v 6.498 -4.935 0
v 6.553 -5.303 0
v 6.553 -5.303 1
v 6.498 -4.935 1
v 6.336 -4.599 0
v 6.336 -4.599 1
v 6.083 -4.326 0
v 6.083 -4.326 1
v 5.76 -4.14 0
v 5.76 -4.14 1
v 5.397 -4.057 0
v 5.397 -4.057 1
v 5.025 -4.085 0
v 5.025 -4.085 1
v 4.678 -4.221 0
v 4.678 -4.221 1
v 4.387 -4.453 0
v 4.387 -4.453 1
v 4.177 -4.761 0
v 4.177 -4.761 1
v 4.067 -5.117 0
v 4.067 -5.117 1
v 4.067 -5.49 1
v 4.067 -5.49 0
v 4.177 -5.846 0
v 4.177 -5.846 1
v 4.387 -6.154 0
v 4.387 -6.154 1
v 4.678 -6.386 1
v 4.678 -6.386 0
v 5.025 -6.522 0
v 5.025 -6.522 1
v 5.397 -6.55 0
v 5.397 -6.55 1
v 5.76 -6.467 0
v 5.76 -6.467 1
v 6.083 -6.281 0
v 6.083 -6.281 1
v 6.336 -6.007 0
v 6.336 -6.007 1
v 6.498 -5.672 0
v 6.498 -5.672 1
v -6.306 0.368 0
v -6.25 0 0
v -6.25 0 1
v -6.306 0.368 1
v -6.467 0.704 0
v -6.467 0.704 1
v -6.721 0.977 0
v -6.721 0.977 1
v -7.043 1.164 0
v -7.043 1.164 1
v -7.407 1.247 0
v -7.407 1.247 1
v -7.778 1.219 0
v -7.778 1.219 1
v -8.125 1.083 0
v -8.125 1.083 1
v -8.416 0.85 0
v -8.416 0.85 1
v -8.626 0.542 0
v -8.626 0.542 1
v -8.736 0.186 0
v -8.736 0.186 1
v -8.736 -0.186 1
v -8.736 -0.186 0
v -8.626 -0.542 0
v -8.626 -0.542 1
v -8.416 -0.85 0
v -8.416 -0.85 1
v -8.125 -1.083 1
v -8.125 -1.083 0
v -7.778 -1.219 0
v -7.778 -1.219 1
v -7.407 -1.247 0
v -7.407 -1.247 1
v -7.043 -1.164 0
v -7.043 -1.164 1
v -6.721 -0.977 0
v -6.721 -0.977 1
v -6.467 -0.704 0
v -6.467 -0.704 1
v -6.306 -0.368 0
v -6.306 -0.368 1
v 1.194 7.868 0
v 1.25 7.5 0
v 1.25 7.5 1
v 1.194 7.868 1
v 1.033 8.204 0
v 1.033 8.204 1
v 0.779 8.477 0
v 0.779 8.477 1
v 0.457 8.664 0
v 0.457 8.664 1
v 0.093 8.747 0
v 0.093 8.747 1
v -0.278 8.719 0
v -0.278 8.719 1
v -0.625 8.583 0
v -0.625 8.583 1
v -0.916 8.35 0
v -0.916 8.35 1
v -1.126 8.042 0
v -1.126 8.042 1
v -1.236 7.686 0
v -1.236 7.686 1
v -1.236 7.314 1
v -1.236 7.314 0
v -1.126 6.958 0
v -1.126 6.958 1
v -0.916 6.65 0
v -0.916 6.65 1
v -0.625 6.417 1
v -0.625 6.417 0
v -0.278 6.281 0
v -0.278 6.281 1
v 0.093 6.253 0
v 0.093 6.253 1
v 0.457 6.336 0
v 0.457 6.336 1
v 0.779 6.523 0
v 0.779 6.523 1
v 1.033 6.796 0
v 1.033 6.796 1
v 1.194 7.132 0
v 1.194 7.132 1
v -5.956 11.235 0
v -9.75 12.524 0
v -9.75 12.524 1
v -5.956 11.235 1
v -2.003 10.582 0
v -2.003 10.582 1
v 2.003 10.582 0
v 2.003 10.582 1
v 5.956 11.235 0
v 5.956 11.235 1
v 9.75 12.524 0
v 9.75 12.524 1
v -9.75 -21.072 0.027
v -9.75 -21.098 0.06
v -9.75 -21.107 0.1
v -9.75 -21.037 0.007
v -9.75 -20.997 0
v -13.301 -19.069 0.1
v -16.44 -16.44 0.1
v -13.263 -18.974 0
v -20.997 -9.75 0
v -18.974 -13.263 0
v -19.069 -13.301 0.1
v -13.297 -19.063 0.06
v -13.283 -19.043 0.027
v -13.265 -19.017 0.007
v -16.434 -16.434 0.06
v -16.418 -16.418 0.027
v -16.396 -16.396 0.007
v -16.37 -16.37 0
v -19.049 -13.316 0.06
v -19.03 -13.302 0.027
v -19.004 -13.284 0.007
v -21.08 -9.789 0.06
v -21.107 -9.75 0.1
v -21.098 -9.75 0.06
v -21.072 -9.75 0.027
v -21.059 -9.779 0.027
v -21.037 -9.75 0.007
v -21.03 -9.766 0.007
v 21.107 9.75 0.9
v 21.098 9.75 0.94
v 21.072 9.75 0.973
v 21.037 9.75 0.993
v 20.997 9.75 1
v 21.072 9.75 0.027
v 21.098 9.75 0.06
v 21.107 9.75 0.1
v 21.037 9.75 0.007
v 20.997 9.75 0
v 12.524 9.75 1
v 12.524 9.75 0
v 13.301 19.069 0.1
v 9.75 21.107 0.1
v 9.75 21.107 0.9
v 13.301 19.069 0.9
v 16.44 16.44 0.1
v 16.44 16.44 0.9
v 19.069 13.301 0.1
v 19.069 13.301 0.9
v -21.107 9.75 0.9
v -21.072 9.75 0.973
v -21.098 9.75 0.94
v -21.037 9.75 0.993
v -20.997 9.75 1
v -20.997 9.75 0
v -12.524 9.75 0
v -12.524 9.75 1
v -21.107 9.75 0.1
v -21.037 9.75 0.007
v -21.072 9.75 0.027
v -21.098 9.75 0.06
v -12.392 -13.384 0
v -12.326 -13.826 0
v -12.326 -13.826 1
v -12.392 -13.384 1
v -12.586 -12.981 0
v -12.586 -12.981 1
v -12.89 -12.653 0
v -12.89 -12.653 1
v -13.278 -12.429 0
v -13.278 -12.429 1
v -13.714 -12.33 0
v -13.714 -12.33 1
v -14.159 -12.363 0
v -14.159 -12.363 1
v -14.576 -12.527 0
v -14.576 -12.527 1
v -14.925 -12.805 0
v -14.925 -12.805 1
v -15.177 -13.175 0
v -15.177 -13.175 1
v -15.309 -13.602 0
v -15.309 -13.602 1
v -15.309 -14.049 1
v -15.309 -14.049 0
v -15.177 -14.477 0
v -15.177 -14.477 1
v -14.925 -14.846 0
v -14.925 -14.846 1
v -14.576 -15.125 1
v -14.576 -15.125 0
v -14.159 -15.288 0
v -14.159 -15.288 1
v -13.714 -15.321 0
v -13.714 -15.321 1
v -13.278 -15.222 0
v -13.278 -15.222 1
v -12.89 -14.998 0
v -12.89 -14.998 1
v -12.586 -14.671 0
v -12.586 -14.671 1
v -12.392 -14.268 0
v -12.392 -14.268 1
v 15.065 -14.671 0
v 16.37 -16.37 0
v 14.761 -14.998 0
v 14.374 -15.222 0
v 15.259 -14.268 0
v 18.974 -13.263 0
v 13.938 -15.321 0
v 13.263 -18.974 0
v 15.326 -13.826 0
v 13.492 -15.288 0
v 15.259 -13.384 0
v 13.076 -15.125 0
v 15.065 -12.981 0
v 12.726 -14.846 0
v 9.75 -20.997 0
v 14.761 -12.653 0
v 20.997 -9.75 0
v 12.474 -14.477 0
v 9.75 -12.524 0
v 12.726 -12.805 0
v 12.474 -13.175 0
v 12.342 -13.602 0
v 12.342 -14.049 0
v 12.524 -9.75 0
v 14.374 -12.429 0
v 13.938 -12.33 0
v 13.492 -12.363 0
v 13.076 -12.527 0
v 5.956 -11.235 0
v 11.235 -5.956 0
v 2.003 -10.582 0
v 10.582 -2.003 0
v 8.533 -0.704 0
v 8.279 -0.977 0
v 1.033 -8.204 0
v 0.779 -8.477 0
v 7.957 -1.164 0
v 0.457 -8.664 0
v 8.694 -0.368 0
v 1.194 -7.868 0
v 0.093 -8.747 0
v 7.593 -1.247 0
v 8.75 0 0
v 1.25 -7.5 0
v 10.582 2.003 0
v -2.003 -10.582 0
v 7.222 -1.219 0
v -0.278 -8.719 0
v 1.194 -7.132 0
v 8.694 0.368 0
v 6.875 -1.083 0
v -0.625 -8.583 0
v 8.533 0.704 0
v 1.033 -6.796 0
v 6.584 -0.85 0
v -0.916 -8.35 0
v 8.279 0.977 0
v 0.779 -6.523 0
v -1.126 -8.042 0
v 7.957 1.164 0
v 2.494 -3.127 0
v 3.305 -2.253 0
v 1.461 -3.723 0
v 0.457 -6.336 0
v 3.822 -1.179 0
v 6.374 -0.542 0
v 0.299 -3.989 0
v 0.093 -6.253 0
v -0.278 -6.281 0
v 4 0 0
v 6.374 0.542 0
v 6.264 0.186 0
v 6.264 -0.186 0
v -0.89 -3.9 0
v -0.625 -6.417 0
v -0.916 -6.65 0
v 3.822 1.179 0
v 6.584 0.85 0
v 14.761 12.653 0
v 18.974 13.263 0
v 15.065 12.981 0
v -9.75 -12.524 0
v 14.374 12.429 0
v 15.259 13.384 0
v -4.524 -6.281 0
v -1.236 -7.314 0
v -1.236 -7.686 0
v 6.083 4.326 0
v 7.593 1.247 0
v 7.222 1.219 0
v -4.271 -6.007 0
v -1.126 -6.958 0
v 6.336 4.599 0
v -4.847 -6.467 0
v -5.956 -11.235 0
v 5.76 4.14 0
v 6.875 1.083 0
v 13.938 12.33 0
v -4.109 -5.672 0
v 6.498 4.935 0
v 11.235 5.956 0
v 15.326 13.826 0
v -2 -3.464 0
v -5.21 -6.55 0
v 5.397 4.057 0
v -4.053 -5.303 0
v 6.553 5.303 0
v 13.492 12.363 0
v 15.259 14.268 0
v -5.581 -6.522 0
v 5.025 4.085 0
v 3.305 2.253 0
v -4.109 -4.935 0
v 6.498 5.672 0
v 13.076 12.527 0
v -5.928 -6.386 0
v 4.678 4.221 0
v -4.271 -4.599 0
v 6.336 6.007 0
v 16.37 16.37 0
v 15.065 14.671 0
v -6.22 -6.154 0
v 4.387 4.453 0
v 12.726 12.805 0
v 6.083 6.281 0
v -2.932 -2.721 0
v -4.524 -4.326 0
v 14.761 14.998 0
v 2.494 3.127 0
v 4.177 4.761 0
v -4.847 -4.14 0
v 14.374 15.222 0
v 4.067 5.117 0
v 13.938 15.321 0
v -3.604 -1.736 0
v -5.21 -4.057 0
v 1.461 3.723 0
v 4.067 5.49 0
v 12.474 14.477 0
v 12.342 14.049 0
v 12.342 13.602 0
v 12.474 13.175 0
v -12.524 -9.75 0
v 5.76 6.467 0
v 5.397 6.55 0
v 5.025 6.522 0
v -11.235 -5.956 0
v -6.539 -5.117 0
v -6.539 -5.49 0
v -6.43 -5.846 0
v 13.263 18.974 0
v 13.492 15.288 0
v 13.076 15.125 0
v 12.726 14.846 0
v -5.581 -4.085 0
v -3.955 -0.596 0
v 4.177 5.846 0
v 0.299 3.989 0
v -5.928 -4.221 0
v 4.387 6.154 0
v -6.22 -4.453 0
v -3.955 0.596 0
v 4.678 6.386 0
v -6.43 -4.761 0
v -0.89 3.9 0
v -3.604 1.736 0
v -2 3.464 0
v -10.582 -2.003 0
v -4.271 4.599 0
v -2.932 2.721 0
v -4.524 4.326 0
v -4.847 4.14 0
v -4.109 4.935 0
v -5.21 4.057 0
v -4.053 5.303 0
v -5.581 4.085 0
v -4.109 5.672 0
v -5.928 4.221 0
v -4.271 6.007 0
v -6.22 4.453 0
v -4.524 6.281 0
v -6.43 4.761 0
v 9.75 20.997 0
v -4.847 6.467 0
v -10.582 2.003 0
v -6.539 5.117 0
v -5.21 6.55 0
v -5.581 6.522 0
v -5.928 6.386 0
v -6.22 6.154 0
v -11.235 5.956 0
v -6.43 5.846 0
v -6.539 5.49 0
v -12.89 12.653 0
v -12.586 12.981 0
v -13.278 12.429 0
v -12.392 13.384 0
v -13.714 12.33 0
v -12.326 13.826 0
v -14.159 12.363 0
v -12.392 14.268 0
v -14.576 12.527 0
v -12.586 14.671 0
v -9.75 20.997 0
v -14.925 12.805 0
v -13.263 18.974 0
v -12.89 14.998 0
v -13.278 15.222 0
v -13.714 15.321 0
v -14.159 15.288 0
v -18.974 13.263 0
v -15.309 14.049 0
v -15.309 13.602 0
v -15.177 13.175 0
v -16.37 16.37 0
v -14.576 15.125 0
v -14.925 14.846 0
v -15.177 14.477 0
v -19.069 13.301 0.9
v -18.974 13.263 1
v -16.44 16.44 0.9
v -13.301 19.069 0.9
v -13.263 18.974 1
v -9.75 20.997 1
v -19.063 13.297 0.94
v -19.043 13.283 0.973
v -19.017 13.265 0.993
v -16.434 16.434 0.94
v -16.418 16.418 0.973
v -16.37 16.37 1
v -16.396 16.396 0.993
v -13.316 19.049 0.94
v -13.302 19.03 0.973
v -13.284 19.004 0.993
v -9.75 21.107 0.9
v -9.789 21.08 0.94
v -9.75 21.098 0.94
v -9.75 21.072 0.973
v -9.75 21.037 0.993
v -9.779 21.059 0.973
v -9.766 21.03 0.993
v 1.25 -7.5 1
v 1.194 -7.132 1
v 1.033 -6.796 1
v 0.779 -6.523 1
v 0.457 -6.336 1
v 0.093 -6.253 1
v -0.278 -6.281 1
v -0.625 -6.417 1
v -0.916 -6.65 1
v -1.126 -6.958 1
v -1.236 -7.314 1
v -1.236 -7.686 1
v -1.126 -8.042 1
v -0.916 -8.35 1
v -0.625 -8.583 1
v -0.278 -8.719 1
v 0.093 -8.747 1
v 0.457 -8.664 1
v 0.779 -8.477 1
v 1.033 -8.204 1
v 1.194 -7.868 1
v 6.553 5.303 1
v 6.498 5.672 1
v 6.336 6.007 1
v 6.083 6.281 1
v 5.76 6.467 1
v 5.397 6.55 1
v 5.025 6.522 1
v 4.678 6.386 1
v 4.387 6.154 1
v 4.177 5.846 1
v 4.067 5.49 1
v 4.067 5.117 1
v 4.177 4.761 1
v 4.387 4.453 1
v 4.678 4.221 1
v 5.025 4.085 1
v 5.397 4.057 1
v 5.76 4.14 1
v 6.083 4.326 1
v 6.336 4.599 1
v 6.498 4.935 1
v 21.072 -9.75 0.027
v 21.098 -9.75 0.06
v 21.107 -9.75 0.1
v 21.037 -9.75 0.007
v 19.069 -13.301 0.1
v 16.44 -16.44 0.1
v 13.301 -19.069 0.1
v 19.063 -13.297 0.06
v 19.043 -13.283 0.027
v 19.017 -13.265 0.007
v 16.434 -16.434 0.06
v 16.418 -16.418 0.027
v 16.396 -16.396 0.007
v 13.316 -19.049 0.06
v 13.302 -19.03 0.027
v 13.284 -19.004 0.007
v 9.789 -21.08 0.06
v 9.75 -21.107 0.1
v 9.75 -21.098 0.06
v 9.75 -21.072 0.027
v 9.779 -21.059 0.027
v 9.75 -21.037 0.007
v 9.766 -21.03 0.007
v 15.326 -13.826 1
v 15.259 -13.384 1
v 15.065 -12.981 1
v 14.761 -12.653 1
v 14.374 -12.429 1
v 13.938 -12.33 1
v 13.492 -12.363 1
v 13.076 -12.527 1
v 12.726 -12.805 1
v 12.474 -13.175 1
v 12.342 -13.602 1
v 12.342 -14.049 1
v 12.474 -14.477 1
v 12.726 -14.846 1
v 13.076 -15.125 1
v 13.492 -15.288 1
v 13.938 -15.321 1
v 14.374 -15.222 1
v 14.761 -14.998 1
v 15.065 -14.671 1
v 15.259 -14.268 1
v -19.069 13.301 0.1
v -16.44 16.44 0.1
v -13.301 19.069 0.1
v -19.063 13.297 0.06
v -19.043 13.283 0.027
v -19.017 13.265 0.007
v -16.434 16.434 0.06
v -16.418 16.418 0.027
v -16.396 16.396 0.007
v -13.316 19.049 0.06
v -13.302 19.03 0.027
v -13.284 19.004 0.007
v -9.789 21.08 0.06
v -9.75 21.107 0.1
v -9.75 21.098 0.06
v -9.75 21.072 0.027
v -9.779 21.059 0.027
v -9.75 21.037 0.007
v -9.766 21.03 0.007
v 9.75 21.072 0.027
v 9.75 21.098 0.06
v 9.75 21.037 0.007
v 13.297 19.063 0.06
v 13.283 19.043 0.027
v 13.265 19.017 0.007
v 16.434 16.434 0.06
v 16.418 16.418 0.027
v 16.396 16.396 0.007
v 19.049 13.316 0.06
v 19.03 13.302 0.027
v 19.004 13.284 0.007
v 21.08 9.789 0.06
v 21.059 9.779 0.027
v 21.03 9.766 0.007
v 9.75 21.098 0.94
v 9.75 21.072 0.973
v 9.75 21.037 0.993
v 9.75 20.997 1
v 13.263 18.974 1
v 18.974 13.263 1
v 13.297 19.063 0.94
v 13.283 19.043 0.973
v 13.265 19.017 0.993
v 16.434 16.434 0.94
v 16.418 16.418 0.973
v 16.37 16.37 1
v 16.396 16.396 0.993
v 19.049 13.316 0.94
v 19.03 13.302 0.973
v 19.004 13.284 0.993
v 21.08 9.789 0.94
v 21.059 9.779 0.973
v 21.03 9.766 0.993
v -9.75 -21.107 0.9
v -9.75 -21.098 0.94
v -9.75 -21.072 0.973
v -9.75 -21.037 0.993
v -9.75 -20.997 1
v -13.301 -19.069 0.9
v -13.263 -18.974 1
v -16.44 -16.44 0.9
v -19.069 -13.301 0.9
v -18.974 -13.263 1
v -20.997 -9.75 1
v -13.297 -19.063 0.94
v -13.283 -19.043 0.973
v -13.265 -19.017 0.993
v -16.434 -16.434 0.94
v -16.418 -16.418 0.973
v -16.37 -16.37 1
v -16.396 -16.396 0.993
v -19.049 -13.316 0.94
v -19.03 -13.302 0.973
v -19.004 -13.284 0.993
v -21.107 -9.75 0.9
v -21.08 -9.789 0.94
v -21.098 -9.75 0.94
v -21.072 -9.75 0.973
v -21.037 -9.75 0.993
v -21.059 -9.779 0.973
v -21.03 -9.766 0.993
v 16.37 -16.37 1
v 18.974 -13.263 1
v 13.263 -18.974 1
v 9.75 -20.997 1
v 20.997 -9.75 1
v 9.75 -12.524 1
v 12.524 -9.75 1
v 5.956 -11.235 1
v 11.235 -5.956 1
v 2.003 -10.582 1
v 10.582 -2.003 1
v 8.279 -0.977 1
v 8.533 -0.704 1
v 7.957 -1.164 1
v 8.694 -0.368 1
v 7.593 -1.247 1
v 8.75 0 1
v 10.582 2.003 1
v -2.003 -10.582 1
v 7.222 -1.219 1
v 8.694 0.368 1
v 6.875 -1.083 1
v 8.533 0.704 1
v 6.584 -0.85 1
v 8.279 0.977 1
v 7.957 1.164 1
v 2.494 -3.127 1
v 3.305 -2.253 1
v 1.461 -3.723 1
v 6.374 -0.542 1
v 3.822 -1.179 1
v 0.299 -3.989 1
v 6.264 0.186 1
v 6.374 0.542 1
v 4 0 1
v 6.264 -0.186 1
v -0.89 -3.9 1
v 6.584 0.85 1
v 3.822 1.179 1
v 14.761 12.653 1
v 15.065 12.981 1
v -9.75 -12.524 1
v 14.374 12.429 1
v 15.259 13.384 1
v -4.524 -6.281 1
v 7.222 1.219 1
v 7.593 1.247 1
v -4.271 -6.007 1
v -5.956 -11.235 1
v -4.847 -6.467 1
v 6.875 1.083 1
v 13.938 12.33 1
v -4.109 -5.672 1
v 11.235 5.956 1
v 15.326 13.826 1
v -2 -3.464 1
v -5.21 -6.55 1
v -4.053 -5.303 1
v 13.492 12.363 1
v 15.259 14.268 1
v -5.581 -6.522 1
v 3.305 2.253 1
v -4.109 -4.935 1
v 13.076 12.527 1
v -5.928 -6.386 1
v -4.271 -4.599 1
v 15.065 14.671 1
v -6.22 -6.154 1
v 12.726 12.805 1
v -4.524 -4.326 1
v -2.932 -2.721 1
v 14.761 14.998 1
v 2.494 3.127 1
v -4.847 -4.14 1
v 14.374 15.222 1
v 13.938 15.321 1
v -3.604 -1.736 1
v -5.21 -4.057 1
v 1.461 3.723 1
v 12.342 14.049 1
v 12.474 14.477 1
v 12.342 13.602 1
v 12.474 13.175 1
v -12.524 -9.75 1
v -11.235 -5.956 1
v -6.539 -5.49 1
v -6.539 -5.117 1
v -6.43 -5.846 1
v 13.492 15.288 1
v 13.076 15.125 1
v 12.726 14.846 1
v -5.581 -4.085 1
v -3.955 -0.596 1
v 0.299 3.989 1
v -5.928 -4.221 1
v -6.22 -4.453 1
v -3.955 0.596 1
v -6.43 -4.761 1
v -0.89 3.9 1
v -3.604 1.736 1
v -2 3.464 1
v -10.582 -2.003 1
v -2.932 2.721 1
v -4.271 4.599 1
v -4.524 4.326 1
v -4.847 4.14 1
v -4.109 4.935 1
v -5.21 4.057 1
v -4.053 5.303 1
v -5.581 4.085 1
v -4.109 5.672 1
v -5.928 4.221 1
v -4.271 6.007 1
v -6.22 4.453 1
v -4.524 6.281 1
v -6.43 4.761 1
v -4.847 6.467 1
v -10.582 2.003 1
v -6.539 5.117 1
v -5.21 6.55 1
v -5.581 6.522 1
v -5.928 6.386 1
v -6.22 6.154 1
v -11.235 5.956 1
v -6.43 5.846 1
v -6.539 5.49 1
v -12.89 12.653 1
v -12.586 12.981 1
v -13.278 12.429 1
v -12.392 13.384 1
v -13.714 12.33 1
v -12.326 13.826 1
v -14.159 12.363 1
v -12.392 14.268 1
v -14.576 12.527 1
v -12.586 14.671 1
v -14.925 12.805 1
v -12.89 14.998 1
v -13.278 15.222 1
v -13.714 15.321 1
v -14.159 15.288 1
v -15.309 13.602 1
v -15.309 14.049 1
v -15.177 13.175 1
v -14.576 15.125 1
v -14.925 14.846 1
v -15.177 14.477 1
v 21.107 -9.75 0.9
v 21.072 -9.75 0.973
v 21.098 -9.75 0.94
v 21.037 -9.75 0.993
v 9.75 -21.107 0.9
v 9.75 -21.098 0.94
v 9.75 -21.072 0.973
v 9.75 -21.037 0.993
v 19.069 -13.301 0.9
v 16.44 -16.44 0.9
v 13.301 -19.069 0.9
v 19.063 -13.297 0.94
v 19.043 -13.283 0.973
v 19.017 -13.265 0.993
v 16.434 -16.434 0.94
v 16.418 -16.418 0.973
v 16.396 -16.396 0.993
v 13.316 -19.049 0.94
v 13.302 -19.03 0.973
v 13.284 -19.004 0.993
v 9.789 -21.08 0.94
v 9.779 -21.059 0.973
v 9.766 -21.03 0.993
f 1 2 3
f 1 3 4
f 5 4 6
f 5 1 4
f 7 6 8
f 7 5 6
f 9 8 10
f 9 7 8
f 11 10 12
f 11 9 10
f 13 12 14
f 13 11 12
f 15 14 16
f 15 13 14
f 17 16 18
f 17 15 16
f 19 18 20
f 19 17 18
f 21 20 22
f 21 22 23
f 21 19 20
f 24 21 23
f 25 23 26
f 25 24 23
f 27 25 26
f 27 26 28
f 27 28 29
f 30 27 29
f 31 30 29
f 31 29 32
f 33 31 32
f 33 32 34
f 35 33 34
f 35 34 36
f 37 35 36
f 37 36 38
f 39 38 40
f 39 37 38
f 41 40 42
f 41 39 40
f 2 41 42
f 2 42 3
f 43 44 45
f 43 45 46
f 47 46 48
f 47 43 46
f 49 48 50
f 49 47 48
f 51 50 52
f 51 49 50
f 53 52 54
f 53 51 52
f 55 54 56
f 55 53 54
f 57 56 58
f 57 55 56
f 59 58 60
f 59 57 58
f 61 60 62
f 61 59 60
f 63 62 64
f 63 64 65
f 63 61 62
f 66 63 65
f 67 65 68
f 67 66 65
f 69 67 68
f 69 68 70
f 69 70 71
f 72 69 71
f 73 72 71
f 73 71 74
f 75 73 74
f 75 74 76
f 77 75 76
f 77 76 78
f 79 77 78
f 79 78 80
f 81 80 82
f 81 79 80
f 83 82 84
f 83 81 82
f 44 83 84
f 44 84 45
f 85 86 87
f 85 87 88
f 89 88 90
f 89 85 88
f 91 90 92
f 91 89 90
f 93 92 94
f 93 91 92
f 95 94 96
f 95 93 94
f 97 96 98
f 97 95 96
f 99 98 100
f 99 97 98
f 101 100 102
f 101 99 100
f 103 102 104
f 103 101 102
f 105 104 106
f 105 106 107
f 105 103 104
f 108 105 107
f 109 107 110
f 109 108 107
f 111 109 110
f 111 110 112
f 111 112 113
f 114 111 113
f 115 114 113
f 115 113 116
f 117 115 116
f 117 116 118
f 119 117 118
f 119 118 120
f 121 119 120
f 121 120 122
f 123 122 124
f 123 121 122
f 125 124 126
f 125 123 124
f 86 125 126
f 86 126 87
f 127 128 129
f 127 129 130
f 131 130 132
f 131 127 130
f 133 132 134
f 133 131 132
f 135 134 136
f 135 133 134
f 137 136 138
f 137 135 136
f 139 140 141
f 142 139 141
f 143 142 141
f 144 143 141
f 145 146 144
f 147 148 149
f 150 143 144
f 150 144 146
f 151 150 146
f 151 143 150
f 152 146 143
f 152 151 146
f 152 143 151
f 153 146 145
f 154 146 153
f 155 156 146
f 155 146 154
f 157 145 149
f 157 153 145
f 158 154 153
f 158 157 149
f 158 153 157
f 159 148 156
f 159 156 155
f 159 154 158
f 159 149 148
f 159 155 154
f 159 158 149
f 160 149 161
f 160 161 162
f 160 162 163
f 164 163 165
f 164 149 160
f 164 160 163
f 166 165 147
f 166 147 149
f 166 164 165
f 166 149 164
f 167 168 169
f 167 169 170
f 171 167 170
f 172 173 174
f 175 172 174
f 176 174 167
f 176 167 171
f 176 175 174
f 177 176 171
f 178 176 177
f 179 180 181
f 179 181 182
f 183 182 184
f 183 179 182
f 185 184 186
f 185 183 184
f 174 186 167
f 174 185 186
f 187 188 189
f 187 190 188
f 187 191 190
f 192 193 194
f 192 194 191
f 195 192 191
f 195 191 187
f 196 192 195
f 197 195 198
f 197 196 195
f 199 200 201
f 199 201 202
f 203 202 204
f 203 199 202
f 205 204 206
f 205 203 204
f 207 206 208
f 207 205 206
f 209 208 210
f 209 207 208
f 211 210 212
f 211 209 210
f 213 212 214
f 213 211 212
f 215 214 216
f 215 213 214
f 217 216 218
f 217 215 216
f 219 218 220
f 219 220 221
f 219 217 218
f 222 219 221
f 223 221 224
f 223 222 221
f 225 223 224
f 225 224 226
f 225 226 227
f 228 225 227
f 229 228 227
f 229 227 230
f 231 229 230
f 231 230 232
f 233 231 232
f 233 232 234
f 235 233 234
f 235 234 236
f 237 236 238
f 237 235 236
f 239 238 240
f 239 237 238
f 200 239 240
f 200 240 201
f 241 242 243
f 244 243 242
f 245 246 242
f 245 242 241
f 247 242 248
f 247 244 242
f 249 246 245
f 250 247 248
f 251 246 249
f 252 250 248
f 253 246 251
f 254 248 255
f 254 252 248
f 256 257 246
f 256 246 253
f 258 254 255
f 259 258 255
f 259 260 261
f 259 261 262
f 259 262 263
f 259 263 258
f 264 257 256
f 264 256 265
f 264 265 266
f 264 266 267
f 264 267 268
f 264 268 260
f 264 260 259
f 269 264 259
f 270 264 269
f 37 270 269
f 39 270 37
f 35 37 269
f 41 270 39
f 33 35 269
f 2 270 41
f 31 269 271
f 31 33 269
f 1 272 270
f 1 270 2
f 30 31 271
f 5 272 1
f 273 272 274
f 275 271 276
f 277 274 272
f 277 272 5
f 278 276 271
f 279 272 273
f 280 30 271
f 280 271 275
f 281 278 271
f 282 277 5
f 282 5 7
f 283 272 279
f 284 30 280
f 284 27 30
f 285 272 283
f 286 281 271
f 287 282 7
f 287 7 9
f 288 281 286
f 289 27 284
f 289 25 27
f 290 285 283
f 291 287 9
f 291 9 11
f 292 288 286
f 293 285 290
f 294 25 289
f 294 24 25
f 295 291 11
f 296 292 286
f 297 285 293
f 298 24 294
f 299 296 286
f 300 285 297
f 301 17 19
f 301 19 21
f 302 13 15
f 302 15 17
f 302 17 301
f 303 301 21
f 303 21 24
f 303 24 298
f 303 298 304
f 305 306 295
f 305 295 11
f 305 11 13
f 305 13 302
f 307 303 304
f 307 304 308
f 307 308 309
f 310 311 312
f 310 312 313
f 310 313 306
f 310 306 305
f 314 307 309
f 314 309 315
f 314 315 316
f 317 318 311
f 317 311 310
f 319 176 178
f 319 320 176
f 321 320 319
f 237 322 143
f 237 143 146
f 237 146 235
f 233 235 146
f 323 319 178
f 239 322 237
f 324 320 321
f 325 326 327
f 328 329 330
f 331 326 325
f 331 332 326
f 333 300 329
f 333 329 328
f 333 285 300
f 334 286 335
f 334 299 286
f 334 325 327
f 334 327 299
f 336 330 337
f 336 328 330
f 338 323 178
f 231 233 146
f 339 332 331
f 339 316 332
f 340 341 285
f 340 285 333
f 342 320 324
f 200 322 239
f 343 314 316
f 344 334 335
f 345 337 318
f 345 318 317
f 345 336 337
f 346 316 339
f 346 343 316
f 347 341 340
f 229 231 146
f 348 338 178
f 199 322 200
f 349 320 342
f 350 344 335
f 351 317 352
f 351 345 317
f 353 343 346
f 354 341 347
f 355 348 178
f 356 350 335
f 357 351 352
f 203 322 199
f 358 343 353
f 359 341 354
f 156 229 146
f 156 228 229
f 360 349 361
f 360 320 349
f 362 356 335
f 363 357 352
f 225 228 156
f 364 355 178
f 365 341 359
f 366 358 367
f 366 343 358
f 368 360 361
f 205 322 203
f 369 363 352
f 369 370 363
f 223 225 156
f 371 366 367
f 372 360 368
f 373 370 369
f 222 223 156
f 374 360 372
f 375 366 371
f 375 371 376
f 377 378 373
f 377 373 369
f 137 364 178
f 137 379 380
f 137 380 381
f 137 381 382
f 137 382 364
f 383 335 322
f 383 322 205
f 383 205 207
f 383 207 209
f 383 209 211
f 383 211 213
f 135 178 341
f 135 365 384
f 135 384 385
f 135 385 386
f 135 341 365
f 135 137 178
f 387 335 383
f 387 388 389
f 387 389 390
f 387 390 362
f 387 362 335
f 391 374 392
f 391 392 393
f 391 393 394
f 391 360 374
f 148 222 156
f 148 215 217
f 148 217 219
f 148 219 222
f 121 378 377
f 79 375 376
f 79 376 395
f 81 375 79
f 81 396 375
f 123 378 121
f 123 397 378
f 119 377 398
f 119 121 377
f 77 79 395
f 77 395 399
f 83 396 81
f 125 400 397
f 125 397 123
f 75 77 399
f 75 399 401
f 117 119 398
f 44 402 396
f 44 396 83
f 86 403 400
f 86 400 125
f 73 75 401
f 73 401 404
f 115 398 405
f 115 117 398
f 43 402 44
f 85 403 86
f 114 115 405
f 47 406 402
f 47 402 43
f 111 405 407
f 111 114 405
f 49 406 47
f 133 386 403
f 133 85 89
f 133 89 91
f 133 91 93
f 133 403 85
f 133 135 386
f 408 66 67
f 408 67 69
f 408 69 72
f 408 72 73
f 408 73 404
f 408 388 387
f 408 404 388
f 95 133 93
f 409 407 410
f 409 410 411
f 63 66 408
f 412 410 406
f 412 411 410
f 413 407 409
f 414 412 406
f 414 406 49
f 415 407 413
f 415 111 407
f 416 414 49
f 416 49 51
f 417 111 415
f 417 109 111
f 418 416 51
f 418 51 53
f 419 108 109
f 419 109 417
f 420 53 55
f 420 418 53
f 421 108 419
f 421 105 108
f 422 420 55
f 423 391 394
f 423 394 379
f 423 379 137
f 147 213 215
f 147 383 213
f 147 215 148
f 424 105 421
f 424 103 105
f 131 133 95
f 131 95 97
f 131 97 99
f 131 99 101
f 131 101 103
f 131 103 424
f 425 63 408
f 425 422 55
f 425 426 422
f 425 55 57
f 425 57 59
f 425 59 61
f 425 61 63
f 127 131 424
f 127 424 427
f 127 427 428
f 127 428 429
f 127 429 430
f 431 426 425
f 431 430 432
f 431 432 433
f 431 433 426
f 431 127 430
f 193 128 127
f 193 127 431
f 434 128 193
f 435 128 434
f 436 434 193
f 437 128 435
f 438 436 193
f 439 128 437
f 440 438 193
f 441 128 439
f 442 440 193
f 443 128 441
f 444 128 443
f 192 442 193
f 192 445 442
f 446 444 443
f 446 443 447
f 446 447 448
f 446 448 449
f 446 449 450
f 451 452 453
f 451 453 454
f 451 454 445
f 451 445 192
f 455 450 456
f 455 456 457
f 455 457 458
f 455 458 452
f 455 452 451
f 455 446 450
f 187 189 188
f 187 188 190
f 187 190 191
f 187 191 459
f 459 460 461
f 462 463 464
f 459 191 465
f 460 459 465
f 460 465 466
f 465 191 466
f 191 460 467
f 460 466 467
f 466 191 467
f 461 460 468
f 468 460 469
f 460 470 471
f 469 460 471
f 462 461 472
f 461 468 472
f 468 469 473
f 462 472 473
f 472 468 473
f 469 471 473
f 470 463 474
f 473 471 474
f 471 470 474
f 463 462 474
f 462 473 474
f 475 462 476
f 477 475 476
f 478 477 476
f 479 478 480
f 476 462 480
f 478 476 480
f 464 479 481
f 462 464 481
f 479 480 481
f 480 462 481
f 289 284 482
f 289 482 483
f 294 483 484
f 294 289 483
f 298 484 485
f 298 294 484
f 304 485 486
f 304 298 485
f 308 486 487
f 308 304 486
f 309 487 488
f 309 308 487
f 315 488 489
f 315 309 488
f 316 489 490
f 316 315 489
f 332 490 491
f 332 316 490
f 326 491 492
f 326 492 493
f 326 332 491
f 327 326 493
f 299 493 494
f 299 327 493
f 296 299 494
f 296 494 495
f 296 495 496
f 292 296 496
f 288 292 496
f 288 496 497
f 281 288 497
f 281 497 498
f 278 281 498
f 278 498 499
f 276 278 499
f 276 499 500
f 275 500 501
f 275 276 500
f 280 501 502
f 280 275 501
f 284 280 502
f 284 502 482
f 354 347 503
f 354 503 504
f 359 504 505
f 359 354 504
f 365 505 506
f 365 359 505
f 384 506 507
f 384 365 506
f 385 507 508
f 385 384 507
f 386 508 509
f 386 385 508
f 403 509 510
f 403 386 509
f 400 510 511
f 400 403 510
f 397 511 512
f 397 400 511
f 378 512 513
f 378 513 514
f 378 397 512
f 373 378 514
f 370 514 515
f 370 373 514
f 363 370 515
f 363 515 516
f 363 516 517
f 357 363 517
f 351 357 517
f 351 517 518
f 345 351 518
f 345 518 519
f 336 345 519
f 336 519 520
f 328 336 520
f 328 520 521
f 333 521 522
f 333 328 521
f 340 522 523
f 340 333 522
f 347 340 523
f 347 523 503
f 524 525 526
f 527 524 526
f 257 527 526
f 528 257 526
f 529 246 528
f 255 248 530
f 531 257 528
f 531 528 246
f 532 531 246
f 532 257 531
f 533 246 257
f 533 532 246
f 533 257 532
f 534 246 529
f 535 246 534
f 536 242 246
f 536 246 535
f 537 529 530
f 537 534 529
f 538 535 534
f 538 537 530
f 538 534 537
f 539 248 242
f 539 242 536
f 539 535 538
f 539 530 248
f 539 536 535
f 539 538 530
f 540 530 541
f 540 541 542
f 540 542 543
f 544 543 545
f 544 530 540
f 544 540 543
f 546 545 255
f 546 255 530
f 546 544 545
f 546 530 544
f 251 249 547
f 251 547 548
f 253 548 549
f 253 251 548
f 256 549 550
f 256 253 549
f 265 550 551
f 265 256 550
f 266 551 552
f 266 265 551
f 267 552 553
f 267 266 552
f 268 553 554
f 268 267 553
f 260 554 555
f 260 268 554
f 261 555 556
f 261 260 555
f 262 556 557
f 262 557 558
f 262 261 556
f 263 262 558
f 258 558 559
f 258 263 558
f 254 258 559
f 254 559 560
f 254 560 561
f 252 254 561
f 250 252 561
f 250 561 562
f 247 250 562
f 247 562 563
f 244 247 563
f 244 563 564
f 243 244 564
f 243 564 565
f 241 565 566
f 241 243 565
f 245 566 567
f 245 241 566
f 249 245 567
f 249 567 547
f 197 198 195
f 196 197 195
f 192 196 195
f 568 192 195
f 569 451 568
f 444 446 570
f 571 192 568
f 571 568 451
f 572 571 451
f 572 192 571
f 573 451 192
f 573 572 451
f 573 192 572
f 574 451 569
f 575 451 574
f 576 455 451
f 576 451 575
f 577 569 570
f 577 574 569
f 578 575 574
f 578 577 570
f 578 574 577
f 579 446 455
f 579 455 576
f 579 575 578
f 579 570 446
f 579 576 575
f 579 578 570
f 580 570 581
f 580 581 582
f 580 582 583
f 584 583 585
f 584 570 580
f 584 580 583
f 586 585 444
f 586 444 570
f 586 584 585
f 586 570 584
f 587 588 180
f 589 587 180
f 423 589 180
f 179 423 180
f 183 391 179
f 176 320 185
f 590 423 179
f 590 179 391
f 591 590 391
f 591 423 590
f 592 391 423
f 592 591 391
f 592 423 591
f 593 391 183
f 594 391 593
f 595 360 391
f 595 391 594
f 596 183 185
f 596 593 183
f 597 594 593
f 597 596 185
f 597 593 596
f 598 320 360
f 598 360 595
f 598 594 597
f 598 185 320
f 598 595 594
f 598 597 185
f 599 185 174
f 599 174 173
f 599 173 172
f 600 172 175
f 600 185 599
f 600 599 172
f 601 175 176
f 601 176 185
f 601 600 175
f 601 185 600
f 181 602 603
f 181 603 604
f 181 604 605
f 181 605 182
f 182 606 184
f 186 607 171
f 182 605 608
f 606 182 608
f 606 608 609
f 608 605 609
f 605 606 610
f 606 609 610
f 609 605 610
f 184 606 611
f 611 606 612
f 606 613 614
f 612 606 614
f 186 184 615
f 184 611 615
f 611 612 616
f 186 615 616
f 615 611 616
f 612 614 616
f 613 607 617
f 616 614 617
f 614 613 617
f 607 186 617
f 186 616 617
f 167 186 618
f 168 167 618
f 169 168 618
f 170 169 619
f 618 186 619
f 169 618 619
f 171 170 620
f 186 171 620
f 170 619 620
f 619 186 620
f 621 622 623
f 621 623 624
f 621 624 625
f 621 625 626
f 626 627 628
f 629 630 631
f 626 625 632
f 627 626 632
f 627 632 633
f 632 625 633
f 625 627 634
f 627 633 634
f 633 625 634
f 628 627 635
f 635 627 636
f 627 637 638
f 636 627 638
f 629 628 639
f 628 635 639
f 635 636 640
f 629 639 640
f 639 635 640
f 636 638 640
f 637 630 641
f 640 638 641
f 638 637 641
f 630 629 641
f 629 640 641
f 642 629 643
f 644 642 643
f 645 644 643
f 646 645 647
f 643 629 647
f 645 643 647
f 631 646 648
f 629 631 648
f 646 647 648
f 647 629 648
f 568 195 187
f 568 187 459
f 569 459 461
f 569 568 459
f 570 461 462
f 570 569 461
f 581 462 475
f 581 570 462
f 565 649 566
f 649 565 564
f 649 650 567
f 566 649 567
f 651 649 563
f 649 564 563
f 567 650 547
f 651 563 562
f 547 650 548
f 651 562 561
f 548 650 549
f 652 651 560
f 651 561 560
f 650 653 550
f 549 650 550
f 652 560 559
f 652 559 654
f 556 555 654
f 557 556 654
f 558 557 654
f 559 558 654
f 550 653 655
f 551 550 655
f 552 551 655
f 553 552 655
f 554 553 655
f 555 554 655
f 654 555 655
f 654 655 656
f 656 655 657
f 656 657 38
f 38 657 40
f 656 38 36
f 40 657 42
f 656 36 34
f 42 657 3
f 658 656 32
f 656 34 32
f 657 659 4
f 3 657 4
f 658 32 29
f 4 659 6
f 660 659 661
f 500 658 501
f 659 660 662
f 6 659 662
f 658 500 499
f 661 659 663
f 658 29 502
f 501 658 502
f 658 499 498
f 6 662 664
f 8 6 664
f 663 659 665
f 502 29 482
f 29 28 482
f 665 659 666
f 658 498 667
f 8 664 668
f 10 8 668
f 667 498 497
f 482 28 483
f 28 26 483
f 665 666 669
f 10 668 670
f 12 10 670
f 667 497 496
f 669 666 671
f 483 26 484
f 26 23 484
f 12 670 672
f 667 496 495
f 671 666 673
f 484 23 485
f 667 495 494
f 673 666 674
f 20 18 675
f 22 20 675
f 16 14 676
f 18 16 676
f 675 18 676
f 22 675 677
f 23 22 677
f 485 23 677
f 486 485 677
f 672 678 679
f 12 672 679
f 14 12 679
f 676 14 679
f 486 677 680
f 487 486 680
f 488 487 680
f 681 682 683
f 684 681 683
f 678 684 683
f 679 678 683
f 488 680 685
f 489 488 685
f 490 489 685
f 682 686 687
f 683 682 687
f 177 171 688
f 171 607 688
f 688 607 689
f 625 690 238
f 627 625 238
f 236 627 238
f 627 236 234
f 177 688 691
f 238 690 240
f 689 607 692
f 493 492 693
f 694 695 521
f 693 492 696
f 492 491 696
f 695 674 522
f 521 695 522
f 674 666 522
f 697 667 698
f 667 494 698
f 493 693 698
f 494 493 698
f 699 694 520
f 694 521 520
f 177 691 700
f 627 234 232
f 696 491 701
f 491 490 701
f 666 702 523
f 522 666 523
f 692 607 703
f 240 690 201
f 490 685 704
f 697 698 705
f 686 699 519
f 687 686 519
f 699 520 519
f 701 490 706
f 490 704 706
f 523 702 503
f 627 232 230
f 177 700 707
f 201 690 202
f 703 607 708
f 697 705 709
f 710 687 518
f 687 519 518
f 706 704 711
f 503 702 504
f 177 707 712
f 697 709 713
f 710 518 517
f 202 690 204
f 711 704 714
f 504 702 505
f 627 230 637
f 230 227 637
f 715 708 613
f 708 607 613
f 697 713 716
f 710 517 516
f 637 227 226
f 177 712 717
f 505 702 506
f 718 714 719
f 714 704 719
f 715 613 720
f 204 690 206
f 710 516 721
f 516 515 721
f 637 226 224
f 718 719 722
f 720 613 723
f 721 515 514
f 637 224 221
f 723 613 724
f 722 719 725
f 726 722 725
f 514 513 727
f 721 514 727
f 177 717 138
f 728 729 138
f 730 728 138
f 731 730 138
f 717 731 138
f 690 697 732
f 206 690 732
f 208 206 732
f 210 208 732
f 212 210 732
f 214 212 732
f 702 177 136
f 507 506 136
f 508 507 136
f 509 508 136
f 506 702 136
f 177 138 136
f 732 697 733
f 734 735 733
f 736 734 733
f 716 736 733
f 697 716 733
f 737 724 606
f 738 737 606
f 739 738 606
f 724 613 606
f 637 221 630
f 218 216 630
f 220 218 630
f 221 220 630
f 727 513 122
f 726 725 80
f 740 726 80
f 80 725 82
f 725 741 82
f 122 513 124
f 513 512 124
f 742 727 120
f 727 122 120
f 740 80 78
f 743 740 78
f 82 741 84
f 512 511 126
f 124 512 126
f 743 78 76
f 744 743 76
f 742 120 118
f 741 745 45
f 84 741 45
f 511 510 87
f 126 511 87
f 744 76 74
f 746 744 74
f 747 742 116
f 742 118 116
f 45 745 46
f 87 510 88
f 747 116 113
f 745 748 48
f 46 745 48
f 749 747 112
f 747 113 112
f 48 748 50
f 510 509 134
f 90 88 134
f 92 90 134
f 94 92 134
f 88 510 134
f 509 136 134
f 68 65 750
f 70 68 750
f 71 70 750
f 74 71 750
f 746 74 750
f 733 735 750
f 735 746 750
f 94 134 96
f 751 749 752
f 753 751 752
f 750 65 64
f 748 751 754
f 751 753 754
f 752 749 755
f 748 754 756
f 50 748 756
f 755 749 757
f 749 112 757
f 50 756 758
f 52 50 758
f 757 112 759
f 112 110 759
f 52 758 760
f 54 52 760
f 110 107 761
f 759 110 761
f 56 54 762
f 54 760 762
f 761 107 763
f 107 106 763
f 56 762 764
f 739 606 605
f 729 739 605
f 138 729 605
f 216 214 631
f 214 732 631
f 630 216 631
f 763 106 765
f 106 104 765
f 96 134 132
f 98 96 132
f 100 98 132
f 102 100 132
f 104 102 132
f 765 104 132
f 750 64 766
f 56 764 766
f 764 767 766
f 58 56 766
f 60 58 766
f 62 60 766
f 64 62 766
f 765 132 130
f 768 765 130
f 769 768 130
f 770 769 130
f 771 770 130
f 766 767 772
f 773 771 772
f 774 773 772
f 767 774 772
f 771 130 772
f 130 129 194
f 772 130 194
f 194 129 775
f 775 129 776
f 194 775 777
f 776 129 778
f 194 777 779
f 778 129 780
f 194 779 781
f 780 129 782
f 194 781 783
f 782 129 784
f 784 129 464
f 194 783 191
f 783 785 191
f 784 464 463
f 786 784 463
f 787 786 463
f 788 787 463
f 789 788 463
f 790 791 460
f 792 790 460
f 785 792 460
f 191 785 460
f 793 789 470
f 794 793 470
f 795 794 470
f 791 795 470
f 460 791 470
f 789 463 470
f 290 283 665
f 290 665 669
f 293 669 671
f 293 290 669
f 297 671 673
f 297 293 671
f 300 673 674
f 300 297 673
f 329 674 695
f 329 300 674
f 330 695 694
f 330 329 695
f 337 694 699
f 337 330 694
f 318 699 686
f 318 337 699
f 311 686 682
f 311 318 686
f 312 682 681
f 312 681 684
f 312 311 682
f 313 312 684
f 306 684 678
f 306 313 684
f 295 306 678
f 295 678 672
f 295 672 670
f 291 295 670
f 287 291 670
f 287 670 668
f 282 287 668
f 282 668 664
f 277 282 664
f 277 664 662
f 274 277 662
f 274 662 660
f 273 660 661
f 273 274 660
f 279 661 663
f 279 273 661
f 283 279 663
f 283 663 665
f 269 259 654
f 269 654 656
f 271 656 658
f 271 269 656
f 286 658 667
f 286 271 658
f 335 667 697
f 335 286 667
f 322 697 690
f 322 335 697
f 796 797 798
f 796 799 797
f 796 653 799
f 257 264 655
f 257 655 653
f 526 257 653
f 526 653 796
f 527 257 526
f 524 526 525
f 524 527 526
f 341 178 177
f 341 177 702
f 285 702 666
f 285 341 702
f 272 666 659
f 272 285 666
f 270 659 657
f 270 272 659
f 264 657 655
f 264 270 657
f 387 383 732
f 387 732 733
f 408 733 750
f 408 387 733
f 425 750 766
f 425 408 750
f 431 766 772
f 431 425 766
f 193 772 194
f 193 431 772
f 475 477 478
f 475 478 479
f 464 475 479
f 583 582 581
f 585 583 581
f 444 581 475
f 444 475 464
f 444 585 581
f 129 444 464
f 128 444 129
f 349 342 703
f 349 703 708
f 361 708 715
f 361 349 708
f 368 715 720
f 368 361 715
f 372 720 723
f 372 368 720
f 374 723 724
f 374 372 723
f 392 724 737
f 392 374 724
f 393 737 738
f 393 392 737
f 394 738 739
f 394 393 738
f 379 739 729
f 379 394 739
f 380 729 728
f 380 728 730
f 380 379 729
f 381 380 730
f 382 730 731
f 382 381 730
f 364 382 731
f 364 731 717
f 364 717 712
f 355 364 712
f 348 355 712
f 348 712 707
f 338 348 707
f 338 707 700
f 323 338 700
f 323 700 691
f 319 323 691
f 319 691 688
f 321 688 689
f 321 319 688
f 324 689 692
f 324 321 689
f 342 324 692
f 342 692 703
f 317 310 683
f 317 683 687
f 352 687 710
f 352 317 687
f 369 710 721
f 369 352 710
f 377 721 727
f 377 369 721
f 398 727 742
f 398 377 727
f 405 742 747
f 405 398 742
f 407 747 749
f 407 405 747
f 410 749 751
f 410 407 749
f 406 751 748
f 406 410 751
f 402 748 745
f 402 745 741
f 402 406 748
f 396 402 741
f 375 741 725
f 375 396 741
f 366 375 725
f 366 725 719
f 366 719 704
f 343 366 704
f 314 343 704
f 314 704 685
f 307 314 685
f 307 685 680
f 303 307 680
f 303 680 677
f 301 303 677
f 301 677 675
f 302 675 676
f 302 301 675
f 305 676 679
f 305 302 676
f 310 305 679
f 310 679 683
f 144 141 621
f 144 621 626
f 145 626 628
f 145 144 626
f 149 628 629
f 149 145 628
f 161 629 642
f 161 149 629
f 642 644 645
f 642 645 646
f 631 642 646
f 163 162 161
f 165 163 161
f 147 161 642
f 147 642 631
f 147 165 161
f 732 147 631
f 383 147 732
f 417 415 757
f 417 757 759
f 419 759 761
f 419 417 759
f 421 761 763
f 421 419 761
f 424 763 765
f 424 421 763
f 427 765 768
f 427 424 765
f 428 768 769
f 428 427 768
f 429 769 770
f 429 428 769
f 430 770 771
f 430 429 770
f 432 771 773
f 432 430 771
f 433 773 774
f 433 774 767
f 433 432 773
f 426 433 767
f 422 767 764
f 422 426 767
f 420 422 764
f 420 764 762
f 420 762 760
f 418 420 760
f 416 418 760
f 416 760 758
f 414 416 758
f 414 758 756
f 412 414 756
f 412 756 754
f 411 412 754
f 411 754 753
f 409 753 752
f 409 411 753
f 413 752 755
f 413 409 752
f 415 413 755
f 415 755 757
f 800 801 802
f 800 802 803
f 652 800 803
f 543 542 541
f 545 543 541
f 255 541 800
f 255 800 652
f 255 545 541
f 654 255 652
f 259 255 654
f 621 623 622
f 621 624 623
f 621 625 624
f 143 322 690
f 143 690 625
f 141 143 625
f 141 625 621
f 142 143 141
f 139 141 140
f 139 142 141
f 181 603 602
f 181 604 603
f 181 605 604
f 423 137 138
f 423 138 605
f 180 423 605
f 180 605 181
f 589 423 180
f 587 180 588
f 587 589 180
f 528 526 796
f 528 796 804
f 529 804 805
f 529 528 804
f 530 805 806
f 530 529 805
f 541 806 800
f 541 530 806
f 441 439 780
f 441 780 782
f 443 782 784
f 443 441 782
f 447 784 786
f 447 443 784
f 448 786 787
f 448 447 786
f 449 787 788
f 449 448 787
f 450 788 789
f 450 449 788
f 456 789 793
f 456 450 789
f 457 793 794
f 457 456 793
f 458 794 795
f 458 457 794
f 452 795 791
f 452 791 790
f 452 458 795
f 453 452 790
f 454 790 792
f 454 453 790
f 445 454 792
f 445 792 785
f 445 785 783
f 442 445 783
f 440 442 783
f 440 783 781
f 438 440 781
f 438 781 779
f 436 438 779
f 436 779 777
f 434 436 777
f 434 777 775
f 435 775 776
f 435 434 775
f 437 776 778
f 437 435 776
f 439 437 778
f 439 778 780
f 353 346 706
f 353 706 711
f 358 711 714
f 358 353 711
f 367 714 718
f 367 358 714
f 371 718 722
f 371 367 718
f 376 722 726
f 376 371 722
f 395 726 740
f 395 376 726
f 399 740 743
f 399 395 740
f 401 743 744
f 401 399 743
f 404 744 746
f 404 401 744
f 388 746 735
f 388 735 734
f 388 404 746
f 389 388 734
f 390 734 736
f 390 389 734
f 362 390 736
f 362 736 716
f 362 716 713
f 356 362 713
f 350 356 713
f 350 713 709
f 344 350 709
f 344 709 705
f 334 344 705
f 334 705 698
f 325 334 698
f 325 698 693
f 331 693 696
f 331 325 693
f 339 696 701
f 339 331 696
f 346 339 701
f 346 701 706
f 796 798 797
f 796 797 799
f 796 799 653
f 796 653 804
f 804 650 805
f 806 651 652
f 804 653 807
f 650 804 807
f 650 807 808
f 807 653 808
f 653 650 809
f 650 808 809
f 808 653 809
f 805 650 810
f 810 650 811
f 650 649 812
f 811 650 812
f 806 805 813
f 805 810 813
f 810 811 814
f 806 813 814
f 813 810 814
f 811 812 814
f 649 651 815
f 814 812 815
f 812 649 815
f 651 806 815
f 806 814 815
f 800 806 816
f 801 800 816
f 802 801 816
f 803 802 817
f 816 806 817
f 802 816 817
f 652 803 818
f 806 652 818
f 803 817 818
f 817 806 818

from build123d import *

# Parameters (mm, degrees)
SKETCH_1_R      = 4
SKETCH_1_R_2    = 1.25
SKETCH_1_R_3    = 1.5
EXTRUDE_1_DEPTH = 1
FILLET_1_R      = 0.1


with BuildPart() as part:
    # Эскиз1 → Бобышка-Вытянуть1 (new body)
    with BuildSketch(Plane.XY):
        with BuildLine():
            Line((21.106870919, 9.75), (12.523623513, 9.75))
            ThreePointArc((12.523623513, 9.75), (10.5, 0), (12.523623513, -9.75))
            Line((12.523623513, -9.75), (21.106870919, -9.75))
            ThreePointArc((21.106870919, -9.75), (16.440232663, -16.440232663), (9.75, -21.106870919))
            Line((9.75, -21.106870919), (9.75, -12.523623513))
            ThreePointArc((9.75, -12.523623513), (0, -10.5), (-9.75, -12.523623513))
            Line((-9.75, -12.523623513), (-9.75, -21.106870919))
            ThreePointArc((-9.75, -21.106870919), (-16.440232663, -16.440232663), (-21.106870919, -9.75))
            Line((-21.106870919, -9.75), (-12.523623513, -9.75))
            ThreePointArc((-12.523623513, -9.75), (-10.5, 0), (-12.523623513, 9.75))
            Line((-12.523623513, 9.75), (-21.106870919, 9.75))
            ThreePointArc((-21.106870919, 9.75), (-16.440232663, 16.440232663), (-9.75, 21.106870919))
            Line((-9.75, 21.106870919), (-9.75, 12.523623513))
            ThreePointArc((-9.75, 12.523623513), (0, 10.5), (9.75, 12.523623513))
            Line((9.75, 12.523623513), (9.75, 21.106870919))
            ThreePointArc((9.75, 21.106870919), (16.440232663, 16.440232663), (21.106870919, 9.75))
        make_face()
        Circle(SKETCH_1_R, mode=Mode.SUBTRACT)
        with Locations((0, 7.5)):
            Circle(SKETCH_1_R_2, mode=Mode.SUBTRACT)
        with Locations((5.303300859, 5.303300859)):
            Circle(SKETCH_1_R_2, mode=Mode.SUBTRACT)
        with Locations((7.5, 0)):
            Circle(SKETCH_1_R_2, mode=Mode.SUBTRACT)
        with Locations((5.303300859, -5.303300859)):
            Circle(SKETCH_1_R_2, mode=Mode.SUBTRACT)
        with Locations((0, -7.5)):
            Circle(SKETCH_1_R_2, mode=Mode.SUBTRACT)
        with Locations((-5.303300859, -5.303300859)):
            Circle(SKETCH_1_R_2, mode=Mode.SUBTRACT)
        with Locations((-7.5, 0)):
            Circle(SKETCH_1_R_2, mode=Mode.SUBTRACT)
        with Locations((-5.303300859, 5.303300859)):
            Circle(SKETCH_1_R_2, mode=Mode.SUBTRACT)
        with Locations((13.825687912, 13.825687912)):
            Circle(SKETCH_1_R_3, mode=Mode.SUBTRACT)
        with Locations((13.825687912, -13.825687912)):
            Circle(SKETCH_1_R_3, mode=Mode.SUBTRACT)
        with Locations((-13.825687912, -13.825687912)):
            Circle(SKETCH_1_R_3, mode=Mode.SUBTRACT)
        with Locations((-13.825687912, 13.825687912)):
            Circle(SKETCH_1_R_3, mode=Mode.SUBTRACT)
    extrude(amount=EXTRUDE_1_DEPTH)

    # Скругление1
    fillet_1_edges = [part.edges().sort_by_distance(p)[0] for p in [
        (16.440232663, 16.440232663, 1),
        (16.440232663, -16.440232663, 0),
        (-16.440232663, -16.440232663, 0),
        (-16.440232663, 16.440232663, 0),
        (16.440232663, 16.440232663, 0),
        (-16.440232663, 16.440232663, 1),
        (-16.440232663, -16.440232663, 1),
        (16.440232663, -16.440232663, 1),
    ]]
    fillet(fillet_1_edges, radius=FILLET_1_R)


solid = part.part
